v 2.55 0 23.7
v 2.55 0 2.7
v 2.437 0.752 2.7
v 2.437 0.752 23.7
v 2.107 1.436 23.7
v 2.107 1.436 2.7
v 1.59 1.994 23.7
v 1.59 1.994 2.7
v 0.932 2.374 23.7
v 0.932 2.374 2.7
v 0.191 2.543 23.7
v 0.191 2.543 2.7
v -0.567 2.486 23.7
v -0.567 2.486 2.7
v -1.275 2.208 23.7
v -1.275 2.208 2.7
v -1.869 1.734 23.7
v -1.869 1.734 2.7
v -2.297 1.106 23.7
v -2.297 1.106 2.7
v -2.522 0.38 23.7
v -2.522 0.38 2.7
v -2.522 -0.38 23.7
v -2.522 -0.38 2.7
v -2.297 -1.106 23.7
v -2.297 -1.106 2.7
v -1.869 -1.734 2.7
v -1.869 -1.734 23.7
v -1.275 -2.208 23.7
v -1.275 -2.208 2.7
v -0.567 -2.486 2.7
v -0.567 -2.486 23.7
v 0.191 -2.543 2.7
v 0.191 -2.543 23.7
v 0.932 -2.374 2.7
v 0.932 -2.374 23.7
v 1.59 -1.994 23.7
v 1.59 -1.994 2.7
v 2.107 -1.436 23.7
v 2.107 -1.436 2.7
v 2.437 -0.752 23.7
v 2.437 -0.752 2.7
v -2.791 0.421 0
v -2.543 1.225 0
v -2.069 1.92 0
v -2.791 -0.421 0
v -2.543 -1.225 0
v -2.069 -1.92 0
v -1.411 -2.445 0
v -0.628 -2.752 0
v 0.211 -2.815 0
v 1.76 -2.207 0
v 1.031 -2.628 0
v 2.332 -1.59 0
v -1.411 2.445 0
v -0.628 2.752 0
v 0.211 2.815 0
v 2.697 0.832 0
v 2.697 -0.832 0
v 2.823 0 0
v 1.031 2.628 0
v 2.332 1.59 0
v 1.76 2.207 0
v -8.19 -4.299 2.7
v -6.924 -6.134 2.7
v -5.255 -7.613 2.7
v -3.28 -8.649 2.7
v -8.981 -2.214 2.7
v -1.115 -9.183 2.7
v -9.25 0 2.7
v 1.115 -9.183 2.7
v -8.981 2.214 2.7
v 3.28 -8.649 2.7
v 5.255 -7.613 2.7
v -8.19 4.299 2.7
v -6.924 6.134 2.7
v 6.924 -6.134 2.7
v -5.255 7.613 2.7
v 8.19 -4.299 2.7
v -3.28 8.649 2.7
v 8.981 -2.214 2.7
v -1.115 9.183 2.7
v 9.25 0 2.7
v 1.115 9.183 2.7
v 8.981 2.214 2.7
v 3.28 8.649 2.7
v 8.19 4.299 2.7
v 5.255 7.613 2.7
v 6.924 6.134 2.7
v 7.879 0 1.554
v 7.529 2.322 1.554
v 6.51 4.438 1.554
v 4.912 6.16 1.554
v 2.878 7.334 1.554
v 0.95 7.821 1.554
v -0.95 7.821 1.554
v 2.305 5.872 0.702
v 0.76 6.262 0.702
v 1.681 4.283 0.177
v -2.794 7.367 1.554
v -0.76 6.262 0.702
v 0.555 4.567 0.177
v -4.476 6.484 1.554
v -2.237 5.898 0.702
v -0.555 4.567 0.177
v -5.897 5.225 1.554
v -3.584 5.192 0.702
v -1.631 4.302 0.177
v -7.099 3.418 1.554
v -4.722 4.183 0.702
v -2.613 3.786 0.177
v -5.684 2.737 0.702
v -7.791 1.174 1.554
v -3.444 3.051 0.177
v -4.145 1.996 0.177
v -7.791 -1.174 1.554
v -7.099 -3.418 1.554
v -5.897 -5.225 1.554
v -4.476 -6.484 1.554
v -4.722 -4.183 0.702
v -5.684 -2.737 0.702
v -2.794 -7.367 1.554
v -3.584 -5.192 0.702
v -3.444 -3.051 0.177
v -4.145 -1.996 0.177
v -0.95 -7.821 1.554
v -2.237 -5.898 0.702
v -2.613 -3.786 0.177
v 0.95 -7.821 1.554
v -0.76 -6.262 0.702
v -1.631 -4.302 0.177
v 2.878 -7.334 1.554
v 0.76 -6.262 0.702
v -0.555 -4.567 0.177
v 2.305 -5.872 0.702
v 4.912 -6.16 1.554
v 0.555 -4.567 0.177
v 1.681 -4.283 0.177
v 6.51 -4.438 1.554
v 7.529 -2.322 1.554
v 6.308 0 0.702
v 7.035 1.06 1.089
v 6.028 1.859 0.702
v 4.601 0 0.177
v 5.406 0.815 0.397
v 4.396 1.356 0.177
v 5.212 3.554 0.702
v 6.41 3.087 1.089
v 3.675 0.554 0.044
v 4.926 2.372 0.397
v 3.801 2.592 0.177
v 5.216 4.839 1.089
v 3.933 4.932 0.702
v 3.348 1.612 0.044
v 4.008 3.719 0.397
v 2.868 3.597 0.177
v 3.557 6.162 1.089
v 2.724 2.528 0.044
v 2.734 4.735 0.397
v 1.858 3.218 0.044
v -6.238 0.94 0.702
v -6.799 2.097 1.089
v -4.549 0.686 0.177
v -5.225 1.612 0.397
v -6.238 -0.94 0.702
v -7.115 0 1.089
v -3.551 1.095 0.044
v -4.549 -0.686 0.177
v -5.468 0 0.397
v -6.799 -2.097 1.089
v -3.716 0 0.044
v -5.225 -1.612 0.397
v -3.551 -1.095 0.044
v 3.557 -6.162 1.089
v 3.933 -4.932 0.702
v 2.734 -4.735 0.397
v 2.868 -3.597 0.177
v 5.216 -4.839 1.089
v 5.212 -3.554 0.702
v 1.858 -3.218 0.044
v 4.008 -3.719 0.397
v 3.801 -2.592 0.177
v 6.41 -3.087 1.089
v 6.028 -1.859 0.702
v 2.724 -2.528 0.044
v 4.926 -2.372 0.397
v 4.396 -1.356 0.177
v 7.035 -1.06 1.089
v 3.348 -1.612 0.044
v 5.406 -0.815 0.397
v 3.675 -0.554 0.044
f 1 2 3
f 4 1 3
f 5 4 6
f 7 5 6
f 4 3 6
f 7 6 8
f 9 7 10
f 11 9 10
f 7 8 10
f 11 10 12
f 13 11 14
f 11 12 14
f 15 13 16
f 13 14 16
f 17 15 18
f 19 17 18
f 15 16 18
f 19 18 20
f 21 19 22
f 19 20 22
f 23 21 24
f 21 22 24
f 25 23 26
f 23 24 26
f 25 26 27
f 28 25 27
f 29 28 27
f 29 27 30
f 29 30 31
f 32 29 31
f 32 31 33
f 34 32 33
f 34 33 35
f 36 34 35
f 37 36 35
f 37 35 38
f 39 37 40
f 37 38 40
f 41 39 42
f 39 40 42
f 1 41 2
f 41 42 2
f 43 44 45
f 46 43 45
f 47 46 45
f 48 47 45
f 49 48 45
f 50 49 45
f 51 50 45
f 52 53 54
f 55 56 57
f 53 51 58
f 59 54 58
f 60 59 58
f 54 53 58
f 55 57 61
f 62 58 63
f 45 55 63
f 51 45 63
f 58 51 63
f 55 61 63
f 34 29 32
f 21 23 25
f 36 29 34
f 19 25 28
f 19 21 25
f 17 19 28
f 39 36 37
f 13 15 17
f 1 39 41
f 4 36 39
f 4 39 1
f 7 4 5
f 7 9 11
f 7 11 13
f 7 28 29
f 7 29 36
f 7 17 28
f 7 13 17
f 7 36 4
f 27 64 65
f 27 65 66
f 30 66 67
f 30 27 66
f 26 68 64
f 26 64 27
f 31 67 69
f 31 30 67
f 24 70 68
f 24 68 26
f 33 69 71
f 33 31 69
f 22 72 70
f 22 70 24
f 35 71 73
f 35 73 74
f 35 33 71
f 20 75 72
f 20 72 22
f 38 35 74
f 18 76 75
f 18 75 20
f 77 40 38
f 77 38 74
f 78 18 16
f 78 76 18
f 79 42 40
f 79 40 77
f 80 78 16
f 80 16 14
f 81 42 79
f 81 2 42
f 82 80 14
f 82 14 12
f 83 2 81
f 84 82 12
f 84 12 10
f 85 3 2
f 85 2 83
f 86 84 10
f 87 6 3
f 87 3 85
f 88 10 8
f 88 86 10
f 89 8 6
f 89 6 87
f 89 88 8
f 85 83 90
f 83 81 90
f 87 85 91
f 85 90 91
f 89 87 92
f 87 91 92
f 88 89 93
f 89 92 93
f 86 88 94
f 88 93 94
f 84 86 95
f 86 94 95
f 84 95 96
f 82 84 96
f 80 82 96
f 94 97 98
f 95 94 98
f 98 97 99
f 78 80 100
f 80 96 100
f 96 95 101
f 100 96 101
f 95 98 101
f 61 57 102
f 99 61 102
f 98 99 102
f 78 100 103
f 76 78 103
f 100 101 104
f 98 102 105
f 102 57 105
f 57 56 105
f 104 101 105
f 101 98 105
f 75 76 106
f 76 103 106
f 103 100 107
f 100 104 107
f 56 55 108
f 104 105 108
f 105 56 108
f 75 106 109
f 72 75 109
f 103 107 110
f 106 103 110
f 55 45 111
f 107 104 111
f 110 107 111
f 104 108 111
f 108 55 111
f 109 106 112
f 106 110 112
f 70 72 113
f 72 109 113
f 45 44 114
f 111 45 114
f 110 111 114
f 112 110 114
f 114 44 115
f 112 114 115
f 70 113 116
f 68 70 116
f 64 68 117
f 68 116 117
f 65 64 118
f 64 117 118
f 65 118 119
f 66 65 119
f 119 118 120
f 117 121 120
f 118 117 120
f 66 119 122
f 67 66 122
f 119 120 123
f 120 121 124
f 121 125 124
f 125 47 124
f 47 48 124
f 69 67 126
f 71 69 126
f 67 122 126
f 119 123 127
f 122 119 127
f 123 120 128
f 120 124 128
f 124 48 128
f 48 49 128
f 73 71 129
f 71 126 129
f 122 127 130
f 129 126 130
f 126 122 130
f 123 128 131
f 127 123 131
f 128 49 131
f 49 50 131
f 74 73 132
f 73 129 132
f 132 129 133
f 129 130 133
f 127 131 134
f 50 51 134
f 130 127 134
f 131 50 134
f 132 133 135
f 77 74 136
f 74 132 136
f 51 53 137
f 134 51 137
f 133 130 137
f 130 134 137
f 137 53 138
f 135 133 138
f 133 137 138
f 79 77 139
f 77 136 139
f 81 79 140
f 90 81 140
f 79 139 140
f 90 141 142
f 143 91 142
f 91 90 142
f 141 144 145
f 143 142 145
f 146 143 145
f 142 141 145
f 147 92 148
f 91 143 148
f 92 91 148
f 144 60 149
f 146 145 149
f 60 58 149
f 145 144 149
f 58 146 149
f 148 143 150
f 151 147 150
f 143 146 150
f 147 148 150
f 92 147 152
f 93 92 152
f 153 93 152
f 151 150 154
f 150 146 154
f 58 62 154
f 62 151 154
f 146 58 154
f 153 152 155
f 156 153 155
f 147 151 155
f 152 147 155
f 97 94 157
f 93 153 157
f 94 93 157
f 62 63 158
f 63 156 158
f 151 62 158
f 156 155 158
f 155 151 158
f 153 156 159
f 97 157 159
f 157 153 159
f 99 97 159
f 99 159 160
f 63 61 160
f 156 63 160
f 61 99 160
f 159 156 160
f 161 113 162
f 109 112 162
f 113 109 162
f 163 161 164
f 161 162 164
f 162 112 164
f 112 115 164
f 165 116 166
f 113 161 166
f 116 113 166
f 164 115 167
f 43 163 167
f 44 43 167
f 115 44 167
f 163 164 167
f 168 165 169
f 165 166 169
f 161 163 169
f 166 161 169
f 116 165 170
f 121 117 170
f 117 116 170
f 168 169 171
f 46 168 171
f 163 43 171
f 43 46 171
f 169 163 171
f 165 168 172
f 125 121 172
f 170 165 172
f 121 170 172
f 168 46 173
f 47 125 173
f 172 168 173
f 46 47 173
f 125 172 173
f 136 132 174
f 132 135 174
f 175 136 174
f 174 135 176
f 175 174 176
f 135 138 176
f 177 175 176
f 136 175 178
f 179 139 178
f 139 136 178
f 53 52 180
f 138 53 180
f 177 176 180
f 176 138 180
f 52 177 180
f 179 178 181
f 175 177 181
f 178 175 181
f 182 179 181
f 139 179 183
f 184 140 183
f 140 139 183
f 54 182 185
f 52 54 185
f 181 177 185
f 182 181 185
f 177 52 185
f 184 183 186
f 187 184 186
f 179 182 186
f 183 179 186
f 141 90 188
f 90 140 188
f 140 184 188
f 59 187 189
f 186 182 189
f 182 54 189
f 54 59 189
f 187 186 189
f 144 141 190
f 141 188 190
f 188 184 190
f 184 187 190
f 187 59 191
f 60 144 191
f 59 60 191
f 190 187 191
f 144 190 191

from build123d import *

# Parameters (mm, degrees)
F0_R     = 9.25
F1_DEPTH = 2.7
F2_R     = 2.55
F3_DEPTH = 21


# Not quite as in the source:
# - a fillet or chamfer that OpenCascade refuses, or shapes differently, is made with other operations: its cross-section is extruded or revolved along the edge and cut away or added


with BuildPart() as f1:
    # F0 (on Top) → F1 (new body)
    with BuildSketch(Plane.XY):
        Circle(F0_R)
    extrude(amount=F1_DEPTH)

    # F2 (on face) → F3 (join)
    with BuildSketch(Plane.XY.offset(2.7)):
        Circle(F2_R)
    extrude(amount=F3_DEPTH)

    # F4: fillet of radius 9 on 1 edges, made by hand

    # F4_s1 → F4_t2 (revolve, cut)
    with BuildSketch(Plane.XZ):
        with BuildLine():
            ThreePointArc((9.25, 2.7), (6.3083994259, 0.7024099884), (2.8227144143, 0))
            Line((2.8227144143, 0), (9.25, 0))
            Line((9.25, 0), (9.25, 2.7))
        make_face()
    revolve(axis=Axis((0, 0, 0), (0, 0, 1)), mode=Mode.SUBTRACT)


solid = f1.part
